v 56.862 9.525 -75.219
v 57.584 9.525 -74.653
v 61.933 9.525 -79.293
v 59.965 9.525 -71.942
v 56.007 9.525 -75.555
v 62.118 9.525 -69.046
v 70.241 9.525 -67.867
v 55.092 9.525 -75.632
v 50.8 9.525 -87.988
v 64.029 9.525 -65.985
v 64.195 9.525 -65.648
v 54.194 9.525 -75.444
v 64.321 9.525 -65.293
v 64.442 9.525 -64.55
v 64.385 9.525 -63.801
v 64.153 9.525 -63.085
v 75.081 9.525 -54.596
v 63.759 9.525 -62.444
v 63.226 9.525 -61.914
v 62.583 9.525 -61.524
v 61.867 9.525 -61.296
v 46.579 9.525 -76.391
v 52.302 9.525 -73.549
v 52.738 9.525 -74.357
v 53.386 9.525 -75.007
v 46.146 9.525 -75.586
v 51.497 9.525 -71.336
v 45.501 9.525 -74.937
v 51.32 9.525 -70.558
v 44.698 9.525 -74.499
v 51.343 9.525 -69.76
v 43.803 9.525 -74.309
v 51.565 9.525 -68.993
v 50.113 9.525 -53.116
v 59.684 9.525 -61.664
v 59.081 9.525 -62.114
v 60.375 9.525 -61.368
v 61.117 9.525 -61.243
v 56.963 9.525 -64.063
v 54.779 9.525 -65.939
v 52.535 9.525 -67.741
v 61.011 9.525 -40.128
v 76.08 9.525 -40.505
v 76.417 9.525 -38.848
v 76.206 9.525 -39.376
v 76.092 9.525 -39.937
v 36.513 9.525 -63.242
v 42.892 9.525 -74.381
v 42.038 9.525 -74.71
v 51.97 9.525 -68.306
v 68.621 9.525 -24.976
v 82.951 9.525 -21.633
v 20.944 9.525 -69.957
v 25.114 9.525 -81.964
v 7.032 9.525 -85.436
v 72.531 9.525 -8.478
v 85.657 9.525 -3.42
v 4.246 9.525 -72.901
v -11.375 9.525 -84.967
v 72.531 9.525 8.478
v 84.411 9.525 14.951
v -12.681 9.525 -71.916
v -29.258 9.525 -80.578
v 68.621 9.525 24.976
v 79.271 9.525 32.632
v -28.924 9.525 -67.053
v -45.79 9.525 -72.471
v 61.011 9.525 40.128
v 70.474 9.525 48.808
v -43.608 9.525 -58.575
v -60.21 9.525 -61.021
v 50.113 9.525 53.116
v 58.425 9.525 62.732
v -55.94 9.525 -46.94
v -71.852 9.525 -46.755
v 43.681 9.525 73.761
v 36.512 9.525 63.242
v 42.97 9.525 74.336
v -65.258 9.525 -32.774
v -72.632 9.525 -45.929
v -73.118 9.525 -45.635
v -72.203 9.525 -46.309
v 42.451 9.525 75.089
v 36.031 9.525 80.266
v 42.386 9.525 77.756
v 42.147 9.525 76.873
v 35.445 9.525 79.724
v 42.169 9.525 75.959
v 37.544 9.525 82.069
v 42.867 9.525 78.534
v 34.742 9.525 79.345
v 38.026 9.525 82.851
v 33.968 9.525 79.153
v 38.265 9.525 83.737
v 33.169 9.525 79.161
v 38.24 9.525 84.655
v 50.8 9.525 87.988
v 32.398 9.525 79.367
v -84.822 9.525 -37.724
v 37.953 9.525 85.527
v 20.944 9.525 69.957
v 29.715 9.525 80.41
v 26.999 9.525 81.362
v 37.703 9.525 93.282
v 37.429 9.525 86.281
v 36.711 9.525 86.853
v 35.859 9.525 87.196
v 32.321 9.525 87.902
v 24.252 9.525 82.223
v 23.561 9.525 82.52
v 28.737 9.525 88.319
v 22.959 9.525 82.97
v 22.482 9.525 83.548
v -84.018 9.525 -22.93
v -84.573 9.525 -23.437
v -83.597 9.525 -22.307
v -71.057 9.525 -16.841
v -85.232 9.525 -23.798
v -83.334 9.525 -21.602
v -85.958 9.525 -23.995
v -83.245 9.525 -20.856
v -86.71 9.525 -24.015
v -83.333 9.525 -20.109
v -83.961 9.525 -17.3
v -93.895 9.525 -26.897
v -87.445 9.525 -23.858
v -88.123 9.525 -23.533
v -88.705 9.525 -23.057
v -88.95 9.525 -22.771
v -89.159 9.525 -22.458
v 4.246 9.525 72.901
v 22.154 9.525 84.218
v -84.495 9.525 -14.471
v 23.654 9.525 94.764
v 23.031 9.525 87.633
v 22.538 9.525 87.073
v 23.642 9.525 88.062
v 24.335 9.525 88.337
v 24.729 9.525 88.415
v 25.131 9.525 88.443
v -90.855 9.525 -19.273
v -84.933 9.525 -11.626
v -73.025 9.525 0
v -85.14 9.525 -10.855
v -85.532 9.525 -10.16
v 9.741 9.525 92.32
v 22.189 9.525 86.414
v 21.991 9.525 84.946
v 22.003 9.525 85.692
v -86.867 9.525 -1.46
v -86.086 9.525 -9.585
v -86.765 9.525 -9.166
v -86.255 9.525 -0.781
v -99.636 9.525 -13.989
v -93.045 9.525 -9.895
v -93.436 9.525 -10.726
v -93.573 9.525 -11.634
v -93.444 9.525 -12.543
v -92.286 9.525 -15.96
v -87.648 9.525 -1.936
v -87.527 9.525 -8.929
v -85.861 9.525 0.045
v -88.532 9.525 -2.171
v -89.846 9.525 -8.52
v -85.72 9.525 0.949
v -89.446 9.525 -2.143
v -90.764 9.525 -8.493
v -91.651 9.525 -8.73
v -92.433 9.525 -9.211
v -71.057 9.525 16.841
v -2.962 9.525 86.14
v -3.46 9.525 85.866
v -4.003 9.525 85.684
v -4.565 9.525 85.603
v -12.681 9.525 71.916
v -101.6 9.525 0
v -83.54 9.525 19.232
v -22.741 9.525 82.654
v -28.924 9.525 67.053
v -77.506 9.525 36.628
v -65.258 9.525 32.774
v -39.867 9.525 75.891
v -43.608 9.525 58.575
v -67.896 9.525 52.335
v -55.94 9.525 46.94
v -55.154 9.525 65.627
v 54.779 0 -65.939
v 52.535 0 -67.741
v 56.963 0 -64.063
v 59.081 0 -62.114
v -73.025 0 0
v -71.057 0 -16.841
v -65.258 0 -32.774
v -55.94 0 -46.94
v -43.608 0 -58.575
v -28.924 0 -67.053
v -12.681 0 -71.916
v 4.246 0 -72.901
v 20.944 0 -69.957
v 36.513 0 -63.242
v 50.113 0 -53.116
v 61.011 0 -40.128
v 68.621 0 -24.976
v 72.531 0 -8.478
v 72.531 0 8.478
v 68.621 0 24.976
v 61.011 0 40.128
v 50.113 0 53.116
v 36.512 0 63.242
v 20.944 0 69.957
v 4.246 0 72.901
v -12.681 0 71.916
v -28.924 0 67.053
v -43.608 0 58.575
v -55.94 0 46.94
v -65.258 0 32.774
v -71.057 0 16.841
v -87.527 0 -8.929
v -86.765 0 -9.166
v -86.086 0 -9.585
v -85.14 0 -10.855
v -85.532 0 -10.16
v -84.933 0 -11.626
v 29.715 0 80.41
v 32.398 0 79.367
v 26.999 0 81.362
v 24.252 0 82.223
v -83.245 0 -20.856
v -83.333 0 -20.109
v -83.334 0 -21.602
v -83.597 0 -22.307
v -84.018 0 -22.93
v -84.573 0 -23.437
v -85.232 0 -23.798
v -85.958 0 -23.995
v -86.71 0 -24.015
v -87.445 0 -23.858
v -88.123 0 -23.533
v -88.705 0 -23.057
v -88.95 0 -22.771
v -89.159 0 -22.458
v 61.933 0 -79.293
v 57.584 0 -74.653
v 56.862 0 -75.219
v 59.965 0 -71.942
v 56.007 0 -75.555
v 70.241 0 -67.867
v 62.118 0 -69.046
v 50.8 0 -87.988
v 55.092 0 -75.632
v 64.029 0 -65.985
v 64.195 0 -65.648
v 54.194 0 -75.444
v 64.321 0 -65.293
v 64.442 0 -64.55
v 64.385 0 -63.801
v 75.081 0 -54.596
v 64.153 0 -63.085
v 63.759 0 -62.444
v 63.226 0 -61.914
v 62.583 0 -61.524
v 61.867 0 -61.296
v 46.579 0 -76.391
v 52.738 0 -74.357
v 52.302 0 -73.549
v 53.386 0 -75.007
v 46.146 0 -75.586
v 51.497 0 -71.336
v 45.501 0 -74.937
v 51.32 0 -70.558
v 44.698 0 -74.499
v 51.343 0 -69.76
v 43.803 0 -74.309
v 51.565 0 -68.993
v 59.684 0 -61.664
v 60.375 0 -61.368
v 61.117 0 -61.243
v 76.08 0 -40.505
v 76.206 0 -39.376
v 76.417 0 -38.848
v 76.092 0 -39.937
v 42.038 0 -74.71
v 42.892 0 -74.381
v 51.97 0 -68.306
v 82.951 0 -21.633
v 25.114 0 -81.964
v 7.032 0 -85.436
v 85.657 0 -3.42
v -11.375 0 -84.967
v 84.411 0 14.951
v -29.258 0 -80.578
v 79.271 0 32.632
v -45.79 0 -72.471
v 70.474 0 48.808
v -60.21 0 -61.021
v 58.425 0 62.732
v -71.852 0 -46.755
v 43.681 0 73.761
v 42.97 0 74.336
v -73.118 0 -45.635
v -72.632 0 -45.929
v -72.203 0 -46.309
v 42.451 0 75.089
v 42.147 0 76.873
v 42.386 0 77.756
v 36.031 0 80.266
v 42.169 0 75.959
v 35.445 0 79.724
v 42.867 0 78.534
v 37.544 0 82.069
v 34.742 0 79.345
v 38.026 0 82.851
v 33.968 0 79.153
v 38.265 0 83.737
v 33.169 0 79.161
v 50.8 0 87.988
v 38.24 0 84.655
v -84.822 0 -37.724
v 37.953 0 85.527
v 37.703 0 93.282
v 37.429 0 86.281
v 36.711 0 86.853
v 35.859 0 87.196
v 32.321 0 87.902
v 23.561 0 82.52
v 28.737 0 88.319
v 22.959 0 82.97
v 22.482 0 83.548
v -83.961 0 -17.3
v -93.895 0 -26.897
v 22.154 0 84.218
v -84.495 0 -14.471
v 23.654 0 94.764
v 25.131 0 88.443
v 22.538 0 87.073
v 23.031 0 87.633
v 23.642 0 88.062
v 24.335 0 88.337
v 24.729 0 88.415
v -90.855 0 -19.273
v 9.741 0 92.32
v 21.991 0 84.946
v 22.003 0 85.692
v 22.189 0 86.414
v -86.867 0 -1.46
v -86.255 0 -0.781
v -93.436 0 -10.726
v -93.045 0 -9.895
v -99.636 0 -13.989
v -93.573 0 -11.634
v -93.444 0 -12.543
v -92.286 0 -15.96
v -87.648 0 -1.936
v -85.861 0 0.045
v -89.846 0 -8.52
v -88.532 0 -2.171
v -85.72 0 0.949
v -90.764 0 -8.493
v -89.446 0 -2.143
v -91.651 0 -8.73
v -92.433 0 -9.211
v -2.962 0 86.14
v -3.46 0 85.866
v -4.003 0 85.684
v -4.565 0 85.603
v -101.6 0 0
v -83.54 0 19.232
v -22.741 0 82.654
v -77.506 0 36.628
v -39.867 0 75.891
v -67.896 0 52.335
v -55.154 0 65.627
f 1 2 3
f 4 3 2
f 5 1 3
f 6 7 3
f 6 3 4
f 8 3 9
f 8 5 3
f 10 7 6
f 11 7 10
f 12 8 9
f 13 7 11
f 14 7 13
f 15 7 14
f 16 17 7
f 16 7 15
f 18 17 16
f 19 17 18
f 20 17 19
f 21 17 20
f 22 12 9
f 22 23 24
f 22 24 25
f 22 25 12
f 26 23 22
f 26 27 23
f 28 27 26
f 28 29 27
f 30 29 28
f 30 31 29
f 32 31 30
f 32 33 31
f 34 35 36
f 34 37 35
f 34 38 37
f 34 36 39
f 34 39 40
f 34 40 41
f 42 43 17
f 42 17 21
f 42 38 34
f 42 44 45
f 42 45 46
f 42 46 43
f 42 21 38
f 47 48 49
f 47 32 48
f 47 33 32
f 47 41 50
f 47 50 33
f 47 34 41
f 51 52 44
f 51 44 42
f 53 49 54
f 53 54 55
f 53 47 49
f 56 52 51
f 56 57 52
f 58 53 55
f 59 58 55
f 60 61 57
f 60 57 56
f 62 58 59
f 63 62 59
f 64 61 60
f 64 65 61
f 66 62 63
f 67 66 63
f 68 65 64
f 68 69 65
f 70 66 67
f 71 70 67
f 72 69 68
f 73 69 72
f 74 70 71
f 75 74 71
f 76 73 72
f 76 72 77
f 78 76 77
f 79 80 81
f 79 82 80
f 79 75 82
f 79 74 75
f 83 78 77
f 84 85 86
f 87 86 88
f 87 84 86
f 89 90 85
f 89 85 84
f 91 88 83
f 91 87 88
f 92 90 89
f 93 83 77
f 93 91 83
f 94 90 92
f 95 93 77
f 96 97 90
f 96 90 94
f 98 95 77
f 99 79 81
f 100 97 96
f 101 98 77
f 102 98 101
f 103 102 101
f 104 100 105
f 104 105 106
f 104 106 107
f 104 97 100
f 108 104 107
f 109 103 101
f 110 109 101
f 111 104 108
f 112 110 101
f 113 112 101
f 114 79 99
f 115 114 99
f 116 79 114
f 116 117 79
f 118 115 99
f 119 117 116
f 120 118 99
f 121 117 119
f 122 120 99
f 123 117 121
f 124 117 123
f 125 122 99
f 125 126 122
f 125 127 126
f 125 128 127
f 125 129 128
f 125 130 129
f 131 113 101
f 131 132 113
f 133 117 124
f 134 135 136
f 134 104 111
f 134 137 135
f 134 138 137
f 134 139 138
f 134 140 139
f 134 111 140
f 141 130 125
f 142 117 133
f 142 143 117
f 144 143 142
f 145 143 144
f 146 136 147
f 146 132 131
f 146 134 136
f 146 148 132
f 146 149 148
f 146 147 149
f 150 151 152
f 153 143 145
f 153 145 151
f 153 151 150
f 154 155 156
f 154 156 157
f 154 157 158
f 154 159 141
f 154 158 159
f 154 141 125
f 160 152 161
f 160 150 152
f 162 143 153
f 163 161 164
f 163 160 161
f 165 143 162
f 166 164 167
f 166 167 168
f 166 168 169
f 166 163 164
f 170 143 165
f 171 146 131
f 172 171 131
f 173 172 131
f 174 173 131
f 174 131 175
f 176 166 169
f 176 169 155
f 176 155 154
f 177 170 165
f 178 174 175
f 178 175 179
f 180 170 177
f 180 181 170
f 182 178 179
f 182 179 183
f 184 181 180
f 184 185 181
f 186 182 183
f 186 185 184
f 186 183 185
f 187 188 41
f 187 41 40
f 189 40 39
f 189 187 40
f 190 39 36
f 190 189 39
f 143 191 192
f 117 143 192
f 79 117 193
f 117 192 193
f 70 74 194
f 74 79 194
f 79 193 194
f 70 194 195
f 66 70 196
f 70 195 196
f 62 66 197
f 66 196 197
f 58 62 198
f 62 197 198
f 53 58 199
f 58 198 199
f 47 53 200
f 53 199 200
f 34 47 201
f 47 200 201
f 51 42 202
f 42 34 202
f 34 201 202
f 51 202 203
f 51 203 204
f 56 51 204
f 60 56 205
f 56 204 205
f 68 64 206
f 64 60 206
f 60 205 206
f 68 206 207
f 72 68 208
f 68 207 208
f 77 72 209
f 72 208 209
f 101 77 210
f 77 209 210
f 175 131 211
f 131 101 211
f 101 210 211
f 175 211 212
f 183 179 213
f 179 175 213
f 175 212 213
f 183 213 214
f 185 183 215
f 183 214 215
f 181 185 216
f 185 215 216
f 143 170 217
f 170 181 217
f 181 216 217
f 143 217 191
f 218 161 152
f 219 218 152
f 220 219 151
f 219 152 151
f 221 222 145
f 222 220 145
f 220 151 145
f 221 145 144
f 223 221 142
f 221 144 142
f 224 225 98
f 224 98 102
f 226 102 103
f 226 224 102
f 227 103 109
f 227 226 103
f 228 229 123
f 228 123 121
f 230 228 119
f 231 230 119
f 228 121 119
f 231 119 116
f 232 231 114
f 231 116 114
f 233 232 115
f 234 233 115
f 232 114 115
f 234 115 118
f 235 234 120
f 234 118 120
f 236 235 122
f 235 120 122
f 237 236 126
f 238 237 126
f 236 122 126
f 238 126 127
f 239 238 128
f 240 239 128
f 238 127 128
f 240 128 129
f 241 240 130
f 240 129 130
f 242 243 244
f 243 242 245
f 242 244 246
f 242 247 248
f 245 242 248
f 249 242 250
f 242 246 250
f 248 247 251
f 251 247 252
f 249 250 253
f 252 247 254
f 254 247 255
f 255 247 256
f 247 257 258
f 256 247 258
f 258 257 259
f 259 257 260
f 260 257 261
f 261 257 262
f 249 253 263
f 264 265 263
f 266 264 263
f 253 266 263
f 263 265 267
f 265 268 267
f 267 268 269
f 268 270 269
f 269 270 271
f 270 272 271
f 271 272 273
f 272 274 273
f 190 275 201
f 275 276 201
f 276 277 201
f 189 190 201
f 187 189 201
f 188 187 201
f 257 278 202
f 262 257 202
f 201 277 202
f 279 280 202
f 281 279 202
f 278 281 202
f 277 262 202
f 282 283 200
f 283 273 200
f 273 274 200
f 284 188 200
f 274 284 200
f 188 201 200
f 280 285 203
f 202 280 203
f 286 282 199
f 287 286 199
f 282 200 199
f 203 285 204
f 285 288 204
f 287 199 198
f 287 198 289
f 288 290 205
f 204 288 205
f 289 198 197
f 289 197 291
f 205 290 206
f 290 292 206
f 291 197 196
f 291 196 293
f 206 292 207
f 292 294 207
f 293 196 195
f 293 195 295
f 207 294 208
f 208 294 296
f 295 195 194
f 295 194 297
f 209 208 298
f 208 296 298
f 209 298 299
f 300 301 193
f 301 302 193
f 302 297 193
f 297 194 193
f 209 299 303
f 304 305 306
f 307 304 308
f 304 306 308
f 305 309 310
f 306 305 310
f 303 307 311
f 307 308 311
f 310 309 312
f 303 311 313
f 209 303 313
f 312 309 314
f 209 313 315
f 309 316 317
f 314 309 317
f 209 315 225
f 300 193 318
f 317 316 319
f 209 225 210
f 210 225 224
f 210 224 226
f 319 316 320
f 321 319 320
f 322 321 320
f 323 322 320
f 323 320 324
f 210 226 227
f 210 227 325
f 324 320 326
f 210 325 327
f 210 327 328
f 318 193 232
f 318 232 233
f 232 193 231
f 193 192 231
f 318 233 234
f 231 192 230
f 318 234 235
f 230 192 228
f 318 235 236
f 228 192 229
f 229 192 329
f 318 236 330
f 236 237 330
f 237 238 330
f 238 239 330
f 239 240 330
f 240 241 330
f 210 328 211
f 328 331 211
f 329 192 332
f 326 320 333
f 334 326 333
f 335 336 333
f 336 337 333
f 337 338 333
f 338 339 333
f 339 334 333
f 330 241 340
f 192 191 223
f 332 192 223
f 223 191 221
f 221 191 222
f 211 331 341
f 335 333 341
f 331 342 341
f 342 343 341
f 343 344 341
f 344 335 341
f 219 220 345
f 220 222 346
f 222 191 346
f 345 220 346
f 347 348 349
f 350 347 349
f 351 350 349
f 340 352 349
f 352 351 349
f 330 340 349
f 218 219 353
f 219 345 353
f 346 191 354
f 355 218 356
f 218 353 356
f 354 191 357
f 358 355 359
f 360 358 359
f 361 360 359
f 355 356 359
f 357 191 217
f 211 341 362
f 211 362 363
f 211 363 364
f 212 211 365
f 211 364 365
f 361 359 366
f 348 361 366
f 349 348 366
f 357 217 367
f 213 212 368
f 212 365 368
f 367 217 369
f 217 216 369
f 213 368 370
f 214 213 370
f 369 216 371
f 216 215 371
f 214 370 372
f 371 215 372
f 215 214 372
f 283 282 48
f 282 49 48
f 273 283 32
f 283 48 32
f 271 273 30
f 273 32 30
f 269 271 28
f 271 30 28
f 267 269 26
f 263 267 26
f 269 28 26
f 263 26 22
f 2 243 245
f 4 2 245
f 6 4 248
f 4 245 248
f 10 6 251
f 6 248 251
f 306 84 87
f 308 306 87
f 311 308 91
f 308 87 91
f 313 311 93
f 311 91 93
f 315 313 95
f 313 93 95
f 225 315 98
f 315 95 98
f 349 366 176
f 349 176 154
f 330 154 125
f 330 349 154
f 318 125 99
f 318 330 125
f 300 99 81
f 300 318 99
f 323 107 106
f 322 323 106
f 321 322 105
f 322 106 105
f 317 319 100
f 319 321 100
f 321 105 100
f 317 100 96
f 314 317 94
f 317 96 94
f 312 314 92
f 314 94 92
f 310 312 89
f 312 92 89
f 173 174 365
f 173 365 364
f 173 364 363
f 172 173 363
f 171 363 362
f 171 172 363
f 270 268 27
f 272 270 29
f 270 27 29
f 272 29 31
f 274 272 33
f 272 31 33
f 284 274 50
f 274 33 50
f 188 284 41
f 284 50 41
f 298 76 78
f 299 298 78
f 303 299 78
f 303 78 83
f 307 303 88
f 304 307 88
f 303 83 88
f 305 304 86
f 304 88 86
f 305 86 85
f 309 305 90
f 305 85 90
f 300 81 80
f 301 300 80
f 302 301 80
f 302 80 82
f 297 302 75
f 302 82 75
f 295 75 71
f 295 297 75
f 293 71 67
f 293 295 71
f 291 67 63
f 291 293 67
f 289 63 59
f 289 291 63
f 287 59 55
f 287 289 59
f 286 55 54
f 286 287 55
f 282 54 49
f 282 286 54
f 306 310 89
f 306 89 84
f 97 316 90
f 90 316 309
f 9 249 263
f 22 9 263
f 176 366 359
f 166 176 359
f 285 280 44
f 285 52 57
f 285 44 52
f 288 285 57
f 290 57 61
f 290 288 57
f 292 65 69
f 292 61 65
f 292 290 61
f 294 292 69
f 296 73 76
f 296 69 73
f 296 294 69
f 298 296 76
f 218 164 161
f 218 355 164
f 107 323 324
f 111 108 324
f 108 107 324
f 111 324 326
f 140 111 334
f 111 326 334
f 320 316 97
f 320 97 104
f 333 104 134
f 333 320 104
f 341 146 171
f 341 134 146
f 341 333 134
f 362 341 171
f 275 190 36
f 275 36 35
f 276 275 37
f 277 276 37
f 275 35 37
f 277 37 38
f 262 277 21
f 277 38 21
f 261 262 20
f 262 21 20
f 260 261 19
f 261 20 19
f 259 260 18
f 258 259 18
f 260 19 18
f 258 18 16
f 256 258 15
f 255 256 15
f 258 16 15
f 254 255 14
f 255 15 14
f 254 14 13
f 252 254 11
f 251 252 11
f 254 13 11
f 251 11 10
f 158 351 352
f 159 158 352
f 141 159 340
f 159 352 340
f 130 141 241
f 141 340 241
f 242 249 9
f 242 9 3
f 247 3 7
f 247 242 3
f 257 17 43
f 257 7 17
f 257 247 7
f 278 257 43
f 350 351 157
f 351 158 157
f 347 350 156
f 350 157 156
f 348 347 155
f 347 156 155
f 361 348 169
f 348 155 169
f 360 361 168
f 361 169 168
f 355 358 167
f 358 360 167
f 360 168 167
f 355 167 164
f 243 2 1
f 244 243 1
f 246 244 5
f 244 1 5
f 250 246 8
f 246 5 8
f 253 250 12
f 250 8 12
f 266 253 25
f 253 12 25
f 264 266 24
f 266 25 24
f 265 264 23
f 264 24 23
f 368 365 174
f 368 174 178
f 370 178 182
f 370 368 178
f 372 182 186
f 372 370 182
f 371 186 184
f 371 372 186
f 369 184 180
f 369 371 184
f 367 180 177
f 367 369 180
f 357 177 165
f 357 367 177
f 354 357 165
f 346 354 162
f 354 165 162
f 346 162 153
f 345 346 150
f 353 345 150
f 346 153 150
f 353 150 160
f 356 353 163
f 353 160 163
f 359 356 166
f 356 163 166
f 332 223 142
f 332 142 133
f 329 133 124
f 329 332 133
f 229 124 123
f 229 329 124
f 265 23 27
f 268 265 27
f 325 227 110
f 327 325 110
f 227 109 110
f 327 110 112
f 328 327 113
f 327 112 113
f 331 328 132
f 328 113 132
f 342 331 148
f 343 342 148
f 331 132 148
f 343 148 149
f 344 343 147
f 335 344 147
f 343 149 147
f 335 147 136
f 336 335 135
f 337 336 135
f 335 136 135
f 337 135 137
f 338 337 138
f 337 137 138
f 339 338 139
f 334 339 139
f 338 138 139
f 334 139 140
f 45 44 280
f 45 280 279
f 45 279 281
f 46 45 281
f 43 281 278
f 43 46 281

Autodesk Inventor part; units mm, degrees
ref_plane "YZ Plane" through (0, 0, 0) normal (1, 0, 0) x (0, 1, 0)
ref_plane "XZ Plane" through (0, 0, 0) normal (0, 1, 0) x (-1, 0, 0)
ref_plane "XY Plane" through (0, 0, 0) normal (0, 0, 1) x (1, 0, 0)
sketch "Sketch1" plane through (0, 0, 0) normal (0, 1, 0) x (-1, 0, 0)
  circle A0 centre (0, 0) radius 73.025
  circle A1 centre (0, 0) radius 85.725
  line L0 (0, 0) -> (101.6, 0) construction
  line L1 (101.6, 0) -> (85.679, -2.8073)
  arc A2 (72.3305, -46.0117) -> (101.6, 0) centre (50.8, 0) ccw
  line L2 (-50.8, 87.9882) -> (-40.4083, 75.6039)
  arc A3 (3.6821, 85.6459) -> (-50.8, 87.9882) centre (-25.4, 43.9941) ccw
  line L3 (-50.8, -87.9882) -> (-45.2707, -72.7966)
  arc A4 (-76.0126, -39.6342) -> (-50.8, -87.9882) centre (-25.4, -43.9941) ccw
  arc A5 (78.2836, -34.935) -> (94.5805, -7.6857) centre (50.8, 0) ccw
  line L4 (94.5805, -7.6857) -> (85.215, -9.3371)
  line L5 (-40.6343, 85.752) -> (-34.5213, 78.4669)
  arc A6 (-8.8872, 85.2631) -> (-40.6343, 85.752) centre (-25.4, 43.9941) ccw
  line L6 (-53.9463, -78.0663) -> (-50.6936, -69.1298)
  arc A7 (-69.3964, -50.3281) -> (-53.9463, -78.0663) centre (-25.4, -43.9941) ccw
  point P0 (85.725, 0)
  point P1 (-42.8625, 74.24)
  point P2 (-42.8625, -74.24)
  point P3 (-8.8872, 85.2631)
  dimension "Ring_ID" = 146.05
  dimension "RingWD" = 12.7
  dimension "ToothDepth" = 15.875
  dimension "d4" = 10
  dimension "d5" = 50.8
  dimension "d8" = 360
  dimension "d13" = 6.35
  dimension "d14" = 6.35
  dimension "d17" = 360
extrude "Extrusion1" add sketch "Sketch1" along normal blind 9.525 contours A1 | A1 A6 L5 L2 A3 | L1 A2 A1 A5 L4 | A1 A7 L6 L3 A4
fillet "Fillet1" radius 3.175 6 edges at (40.4083, 4.7625, 75.6039) (-3.6821, 4.7625, 85.6459) (76.0126, 4.7625, -39.6342) (45.2707, 4.7625, -72.7966) (-85.679, 4.7625, -2.8073) (-72.3305, 4.7625, -46.0117)
fillet "Fillet2" radius 3.175 9 edges at (53.9463, 4.7625, -78.0663) (50.6936, 4.7625, -69.1298) (69.3964, 4.7625, -50.3281) (-94.5805, 4.7625, -7.6857) (-85.215, 4.7625, -9.3371) (-78.2836, 4.7625, -34.935) (40.6343, 4.7625, 85.752) (34.5213, 4.7625, 78.4669) (8.8872, 4.7625, 85.2631)
properties part number "Blade V2" material "Stainless Steel"
